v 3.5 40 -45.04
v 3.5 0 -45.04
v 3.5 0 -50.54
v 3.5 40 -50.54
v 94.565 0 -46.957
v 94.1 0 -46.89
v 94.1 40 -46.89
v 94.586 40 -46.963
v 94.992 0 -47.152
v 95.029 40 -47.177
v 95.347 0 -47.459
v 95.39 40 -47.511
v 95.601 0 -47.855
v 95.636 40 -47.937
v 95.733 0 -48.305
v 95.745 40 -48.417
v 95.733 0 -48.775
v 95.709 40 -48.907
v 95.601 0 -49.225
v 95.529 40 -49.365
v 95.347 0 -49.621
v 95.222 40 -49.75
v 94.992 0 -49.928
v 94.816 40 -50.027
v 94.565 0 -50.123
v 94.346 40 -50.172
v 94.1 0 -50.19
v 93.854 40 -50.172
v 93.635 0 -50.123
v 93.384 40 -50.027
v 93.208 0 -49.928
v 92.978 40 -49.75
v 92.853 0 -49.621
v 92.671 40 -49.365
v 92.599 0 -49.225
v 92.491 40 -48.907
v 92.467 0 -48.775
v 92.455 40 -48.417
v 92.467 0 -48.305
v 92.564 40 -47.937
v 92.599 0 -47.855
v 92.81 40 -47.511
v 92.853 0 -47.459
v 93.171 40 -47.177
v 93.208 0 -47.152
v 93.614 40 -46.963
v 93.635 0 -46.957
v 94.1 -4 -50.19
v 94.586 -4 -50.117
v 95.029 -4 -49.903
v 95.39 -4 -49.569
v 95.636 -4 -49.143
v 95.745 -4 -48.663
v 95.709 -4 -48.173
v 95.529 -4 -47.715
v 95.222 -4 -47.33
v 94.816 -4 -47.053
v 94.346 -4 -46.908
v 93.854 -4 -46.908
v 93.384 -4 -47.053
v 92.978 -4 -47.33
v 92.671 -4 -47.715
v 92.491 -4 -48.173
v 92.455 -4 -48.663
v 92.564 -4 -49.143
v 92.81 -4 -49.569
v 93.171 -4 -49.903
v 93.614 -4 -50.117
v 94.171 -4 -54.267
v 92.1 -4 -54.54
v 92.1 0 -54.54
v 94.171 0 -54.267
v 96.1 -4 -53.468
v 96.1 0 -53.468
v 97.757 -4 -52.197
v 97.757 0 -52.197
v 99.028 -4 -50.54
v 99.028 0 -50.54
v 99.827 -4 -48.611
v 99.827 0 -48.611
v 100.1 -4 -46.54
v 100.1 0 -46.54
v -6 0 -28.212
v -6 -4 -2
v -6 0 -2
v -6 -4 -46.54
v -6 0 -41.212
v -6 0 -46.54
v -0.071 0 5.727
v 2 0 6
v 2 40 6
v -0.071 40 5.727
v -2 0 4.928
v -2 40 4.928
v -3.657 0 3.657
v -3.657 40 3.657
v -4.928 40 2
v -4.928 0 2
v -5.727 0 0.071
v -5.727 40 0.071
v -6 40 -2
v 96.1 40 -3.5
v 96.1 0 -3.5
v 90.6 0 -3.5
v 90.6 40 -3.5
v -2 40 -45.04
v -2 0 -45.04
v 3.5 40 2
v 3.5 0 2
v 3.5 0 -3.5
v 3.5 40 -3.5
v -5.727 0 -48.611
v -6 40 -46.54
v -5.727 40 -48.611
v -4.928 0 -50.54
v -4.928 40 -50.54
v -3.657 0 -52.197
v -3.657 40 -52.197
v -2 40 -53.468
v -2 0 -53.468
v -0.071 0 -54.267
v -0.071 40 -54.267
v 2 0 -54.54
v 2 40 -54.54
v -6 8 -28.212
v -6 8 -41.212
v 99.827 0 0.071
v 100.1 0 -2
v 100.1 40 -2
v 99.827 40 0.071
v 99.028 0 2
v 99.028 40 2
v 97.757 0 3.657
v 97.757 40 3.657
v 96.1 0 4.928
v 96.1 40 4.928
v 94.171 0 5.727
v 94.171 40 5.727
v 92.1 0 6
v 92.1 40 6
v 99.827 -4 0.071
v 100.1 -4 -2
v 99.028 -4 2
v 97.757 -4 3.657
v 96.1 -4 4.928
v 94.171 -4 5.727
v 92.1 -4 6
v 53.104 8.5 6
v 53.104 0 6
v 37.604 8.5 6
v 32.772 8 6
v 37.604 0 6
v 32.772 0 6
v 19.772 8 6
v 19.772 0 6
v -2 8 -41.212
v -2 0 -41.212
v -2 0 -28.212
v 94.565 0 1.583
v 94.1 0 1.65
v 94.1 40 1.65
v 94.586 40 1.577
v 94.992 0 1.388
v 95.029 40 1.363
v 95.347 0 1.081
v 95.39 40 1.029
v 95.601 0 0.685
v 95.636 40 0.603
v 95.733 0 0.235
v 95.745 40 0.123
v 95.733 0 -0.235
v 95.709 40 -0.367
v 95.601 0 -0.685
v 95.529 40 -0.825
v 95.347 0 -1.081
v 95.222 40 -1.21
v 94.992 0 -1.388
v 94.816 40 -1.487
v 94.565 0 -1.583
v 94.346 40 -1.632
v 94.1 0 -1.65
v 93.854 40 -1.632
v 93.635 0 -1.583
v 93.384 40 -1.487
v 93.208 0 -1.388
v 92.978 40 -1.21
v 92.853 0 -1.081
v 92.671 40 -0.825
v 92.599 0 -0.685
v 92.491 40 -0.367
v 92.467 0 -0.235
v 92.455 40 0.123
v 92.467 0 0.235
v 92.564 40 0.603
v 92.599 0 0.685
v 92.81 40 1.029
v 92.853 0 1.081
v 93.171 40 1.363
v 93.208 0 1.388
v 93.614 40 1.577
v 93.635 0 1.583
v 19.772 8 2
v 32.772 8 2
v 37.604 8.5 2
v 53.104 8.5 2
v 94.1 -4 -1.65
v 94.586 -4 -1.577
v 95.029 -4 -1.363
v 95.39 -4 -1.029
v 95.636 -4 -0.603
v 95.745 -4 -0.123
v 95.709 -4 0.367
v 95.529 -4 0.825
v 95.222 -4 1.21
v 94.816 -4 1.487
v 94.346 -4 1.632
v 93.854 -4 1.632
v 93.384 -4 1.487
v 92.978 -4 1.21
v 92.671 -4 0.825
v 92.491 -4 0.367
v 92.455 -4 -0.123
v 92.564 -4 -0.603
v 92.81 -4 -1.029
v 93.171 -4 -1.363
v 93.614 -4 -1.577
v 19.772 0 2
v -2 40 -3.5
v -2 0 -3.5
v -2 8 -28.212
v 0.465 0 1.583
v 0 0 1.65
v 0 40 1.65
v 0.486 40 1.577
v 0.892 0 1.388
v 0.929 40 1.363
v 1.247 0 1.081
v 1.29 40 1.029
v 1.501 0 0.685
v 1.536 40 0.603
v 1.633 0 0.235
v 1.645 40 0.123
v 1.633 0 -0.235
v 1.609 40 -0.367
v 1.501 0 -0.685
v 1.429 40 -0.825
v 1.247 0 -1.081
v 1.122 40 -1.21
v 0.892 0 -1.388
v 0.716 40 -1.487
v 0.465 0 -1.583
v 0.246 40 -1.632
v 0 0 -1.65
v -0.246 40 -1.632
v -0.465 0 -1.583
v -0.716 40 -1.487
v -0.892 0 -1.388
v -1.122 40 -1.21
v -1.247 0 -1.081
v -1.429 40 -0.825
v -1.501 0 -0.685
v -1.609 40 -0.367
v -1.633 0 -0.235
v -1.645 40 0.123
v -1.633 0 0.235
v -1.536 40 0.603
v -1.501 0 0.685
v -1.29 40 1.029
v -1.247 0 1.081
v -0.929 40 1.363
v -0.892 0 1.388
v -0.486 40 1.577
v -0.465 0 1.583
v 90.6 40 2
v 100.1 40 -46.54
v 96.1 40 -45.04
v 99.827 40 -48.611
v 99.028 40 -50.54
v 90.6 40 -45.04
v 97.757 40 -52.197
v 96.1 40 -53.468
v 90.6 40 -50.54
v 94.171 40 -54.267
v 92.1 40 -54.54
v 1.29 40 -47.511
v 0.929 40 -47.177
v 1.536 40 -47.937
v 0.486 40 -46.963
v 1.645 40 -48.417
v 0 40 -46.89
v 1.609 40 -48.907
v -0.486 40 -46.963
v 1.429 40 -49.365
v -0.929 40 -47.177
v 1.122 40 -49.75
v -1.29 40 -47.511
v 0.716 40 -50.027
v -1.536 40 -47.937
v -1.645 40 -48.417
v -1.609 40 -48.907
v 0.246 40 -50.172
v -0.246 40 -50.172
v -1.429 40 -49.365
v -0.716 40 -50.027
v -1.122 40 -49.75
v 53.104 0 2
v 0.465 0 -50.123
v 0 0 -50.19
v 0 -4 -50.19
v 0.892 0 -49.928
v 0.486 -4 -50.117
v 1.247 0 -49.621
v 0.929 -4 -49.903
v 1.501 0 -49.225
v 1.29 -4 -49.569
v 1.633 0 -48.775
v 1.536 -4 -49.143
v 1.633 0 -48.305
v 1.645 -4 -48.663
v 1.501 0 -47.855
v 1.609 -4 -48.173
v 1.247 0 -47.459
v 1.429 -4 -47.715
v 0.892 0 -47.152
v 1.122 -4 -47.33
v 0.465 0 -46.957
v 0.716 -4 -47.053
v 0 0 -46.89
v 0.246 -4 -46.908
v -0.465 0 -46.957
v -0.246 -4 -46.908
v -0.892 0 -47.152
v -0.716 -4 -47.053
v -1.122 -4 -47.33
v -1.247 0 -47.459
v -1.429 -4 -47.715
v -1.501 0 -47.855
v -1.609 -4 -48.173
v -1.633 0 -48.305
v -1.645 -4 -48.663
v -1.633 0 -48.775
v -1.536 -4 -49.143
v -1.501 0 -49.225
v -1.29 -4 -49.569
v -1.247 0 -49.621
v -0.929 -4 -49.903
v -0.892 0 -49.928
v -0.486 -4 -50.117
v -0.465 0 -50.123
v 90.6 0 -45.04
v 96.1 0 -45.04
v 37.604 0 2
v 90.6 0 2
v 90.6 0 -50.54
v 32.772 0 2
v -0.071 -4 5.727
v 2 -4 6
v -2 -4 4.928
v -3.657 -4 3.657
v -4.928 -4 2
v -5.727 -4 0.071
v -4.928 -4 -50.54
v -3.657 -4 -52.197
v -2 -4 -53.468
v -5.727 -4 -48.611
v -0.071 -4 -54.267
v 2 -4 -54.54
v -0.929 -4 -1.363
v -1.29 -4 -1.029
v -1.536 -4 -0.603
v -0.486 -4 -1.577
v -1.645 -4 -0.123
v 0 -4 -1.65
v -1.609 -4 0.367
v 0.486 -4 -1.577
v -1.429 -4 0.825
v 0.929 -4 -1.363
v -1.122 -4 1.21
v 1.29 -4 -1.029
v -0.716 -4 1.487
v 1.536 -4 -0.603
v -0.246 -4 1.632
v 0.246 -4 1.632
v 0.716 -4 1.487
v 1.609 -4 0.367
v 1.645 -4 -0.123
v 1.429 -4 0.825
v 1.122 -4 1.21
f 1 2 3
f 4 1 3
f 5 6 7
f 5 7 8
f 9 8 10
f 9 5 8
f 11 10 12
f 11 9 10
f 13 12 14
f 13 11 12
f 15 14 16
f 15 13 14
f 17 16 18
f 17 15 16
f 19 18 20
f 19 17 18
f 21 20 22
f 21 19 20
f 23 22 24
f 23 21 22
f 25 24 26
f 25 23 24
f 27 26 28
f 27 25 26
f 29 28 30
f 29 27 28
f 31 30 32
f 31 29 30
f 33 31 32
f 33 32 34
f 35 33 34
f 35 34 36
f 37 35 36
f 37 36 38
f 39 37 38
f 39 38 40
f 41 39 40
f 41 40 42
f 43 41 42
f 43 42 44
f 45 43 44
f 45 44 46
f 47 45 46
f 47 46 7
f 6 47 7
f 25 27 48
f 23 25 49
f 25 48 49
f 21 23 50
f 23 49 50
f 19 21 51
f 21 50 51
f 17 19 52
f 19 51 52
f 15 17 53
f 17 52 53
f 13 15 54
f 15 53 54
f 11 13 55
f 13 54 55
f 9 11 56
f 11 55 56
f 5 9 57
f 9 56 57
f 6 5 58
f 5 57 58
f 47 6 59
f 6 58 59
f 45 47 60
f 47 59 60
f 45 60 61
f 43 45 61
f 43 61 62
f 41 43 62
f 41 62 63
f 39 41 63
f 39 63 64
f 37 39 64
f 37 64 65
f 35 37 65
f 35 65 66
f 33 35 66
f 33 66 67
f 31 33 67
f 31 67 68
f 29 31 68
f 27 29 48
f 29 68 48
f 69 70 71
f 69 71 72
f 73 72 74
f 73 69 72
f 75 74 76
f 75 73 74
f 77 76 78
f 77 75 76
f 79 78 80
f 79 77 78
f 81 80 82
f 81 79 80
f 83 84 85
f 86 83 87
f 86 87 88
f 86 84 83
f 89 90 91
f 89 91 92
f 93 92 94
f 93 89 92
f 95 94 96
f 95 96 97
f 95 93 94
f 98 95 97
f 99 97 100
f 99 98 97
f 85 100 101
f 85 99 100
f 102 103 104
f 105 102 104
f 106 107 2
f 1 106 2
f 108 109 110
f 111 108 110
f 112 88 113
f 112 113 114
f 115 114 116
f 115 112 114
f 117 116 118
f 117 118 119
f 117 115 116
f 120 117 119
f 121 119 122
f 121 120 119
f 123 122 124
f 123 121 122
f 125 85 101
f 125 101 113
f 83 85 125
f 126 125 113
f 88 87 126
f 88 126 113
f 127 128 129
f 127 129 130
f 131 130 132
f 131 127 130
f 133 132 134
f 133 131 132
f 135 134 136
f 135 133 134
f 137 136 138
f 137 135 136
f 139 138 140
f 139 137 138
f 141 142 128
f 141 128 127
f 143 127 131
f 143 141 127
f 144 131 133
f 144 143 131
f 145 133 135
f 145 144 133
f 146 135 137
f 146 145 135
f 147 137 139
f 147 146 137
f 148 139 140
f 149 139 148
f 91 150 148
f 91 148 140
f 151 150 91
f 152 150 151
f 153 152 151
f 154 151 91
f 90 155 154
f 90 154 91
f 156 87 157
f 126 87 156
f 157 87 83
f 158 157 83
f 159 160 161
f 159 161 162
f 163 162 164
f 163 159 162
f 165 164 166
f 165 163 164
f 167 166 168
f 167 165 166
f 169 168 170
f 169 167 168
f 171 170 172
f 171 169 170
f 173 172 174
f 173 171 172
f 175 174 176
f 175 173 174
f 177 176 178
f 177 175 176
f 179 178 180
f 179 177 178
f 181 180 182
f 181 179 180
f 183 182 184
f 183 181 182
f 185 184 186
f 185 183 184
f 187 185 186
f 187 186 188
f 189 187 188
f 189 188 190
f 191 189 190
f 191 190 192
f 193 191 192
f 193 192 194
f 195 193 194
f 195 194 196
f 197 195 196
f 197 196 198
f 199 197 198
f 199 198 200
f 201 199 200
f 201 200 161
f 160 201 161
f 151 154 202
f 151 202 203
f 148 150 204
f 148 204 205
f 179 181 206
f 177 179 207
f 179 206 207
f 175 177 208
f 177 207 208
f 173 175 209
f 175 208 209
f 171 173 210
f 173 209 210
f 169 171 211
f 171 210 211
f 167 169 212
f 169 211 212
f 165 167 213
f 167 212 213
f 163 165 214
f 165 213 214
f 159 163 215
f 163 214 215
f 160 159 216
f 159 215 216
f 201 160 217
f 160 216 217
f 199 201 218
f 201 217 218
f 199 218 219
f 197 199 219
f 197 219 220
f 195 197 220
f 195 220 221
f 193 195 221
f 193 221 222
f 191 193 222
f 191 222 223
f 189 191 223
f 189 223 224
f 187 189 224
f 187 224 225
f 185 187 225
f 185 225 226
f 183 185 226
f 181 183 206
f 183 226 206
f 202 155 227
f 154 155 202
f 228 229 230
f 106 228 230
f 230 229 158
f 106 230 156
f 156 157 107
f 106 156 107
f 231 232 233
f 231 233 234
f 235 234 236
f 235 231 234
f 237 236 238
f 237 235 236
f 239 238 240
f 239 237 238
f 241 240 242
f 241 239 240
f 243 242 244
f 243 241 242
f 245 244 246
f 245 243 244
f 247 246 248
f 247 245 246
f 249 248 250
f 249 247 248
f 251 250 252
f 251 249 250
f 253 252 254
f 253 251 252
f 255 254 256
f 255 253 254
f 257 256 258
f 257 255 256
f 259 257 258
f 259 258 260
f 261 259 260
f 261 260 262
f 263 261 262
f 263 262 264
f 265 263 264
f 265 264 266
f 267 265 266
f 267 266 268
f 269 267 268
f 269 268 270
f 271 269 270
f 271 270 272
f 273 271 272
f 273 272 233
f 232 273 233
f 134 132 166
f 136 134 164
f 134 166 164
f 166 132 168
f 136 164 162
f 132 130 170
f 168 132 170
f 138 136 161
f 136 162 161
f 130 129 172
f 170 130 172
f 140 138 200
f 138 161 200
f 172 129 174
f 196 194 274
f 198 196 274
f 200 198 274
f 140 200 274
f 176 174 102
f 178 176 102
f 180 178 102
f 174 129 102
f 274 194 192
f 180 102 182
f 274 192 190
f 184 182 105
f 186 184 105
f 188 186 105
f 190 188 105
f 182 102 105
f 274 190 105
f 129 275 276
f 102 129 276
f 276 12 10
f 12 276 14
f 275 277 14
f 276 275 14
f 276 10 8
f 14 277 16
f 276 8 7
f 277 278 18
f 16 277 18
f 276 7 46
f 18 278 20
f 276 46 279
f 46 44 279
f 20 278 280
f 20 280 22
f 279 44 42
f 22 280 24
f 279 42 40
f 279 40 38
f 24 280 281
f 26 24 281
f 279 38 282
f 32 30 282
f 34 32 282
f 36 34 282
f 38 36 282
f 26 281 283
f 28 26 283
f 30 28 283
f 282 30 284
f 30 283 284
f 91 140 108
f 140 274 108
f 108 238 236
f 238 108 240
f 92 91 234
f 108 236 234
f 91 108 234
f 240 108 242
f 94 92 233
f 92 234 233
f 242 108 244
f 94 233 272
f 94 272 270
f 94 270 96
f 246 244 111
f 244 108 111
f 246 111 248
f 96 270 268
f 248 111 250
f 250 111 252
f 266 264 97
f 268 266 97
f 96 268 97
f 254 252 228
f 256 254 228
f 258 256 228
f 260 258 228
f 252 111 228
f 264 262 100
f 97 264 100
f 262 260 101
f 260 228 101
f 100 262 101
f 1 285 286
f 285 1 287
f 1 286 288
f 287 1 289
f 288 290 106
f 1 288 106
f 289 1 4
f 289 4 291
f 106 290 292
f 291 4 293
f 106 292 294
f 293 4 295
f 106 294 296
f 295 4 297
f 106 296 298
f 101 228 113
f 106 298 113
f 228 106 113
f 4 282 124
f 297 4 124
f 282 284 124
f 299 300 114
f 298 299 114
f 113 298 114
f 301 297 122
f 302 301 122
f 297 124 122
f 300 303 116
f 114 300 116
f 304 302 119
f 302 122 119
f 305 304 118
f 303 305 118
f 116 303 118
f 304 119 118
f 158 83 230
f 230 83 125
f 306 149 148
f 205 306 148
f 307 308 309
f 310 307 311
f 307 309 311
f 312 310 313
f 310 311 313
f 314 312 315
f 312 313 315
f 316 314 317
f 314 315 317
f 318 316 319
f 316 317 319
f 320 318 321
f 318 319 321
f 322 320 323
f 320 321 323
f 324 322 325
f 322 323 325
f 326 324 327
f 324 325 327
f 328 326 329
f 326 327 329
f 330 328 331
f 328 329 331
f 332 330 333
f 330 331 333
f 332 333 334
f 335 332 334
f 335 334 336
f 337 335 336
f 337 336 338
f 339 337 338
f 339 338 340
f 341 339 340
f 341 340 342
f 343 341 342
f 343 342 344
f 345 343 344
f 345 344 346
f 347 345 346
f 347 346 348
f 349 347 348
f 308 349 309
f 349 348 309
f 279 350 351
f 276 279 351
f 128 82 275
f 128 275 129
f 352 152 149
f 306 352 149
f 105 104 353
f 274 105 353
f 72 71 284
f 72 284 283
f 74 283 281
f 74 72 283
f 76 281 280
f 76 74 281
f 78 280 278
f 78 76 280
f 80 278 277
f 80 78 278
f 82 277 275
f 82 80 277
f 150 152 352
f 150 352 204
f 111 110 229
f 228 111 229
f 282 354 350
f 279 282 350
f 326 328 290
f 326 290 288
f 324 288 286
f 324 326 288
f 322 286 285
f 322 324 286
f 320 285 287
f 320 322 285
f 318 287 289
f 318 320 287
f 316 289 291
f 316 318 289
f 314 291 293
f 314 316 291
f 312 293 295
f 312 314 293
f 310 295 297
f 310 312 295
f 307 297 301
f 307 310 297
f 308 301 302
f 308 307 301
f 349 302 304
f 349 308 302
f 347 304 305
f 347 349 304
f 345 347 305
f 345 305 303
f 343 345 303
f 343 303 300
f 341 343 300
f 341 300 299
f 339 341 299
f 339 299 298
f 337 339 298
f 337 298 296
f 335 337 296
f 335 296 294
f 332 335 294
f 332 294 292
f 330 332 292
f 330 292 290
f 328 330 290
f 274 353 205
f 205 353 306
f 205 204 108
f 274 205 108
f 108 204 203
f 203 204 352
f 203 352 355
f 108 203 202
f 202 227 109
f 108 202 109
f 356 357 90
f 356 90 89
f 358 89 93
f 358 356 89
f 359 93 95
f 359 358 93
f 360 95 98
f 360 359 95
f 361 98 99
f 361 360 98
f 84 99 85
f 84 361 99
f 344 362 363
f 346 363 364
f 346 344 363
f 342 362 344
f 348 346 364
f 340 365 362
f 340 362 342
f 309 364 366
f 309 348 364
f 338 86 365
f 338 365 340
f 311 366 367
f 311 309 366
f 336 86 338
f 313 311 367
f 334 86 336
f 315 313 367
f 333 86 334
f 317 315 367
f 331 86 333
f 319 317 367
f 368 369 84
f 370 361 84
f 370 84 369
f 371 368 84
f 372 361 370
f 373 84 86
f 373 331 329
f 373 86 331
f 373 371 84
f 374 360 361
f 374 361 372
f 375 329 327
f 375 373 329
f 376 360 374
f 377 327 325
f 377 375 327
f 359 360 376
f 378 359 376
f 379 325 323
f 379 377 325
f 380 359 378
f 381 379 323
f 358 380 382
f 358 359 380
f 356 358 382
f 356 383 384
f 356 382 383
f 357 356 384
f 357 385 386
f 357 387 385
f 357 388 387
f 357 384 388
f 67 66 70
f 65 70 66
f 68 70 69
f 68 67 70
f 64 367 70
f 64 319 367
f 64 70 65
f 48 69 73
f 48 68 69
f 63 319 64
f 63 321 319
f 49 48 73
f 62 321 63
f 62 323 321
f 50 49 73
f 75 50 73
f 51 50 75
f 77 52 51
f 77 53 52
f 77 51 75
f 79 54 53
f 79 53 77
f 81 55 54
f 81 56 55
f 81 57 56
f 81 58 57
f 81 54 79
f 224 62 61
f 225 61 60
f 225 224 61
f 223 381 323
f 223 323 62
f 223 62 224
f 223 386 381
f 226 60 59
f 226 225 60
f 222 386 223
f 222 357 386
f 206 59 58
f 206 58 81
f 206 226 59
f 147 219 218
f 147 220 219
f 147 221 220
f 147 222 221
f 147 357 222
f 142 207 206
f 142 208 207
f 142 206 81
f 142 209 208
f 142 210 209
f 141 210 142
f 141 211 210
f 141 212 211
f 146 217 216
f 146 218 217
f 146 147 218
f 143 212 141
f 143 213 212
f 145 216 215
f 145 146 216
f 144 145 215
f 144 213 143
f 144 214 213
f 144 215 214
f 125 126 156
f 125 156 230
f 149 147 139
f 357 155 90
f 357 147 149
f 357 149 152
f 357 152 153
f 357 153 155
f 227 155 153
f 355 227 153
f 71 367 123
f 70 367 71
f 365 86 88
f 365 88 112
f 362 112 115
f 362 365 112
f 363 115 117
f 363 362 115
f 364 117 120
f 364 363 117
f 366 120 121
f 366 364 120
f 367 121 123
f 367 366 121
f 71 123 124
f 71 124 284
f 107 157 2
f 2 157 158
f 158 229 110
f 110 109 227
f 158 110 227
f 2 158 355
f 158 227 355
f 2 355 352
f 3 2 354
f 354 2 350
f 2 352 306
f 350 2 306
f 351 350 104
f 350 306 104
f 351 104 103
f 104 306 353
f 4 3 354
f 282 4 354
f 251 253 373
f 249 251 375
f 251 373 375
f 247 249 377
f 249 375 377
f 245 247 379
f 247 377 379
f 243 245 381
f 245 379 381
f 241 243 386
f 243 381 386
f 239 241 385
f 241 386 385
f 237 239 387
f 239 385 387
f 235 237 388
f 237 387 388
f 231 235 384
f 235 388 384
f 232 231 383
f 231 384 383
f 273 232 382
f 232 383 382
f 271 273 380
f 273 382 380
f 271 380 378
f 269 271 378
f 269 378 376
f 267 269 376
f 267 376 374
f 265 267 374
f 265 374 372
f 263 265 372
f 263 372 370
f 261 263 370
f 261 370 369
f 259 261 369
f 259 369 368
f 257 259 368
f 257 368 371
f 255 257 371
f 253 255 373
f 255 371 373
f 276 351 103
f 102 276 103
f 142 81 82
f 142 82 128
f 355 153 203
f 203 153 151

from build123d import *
from build123d.topology import SkipClean

# Parameters (mm, degrees)
SKETCH1_R           = 1.65
BOSS_EXTRUDE1_DEPTH = 40
BOSS_EXTRUDE2_START = 4
SKETCH2_R           = 1.65
BOSS_EXTRUDE2_DEPTH = 4
SKETCH3_W           = 15.5
SKETCH3_H           = 8.5
CUT_EXTRUDE1_DEPTH  = 4
SKETCH5_W           = 13
SKETCH5_H           = 8
CUT_EXTRUDE2_DEPTH  = 4
SKETCH6_W           = 13
SKETCH6_H           = 8
CUT_EXTRUDE3_DEPTH  = 4


with BuildPart() as part:
    # Sketch1 → Boss-Extrude1 (new body)
    with BuildSketch(Plane(origin=(0, 0, 0), x_dir=(1, 0, 0), z_dir=(0, 1, 0))):
        with BuildLine():
            Line((2, 54.54), (92.1, 54.54))
            ThreePointArc((92.1, 54.54), (97.756854249, 52.196854249), (100.1, 46.54))
            Line((100.1, 46.54), (100.1, 2))
            ThreePointArc((100.1, 2), (97.756854249, -3.656854249), (92.1, -6))
            Line((92.1, -6), (2, -6))
            ThreePointArc((2, -6), (-3.656854249, -3.656854249), (-6, 2))
            Line((-6, 2), (-6, 46.54))
            ThreePointArc((-6, 46.54), (-3.656854249, 52.196854249), (2, 54.54))
        make_face()
        with Locations(Location((0, 48.54, 0), (0, 0, 270))):
            Circle(SKETCH1_R, mode=Mode.SUBTRACT)
        with Locations(Location((0, 0, 0), (0, 0, 270))):
            Circle(SKETCH1_R, mode=Mode.SUBTRACT)
        with Locations(Location((94.1, 48.54, 0), (0, 0, 270))):
            Circle(SKETCH1_R, mode=Mode.SUBTRACT)
        with Locations(Location((94.1, 0, 0), (0, 0, 270))):
            Circle(SKETCH1_R, mode=Mode.SUBTRACT)
        Polygon((-2, 45.04), (3.5, 45.04), (3.5, 50.54), (90.6, 50.54), (90.6, 45.04), (96.1, 45.04), (96.1, 3.5), (90.6, 3.5), (90.6, -2), (3.5, -2), (3.5, 3.5), (-2, 3.5), align=None, mode=Mode.SUBTRACT)
    extrude(amount=BOSS_EXTRUDE1_DEPTH)

    # Sketch2 → Boss-Extrude2 (add)
    with SkipClean():  # the faces are left unmerged after this step: merging them gives an invalid solid
        with BuildSketch(Plane.XZ.offset(BOSS_EXTRUDE2_START)):
            with BuildLine():
                Line((100.1, -46.54), (100.1, -2))
                ThreePointArc((100.1, -2), (97.756854249, 3.656854249), (92.1, 6))
                Line((92.1, 6), (2, 6))
                ThreePointArc((2, 6), (-3.656854249, 3.656854249), (-6, -2))
                Line((-6, -2), (-6, -46.54))
                ThreePointArc((-6, -46.54), (-3.656854249, -52.196854249), (2, -54.54))
                Line((2, -54.54), (92.1, -54.54))
                ThreePointArc((92.1, -54.54), (97.756854249, -52.196854249), (100.1, -46.54))
            make_face()
            with Locations(Location((94.1, 0, 0), (0, 0, 270))):
                Circle(SKETCH2_R, mode=Mode.SUBTRACT)
            with Locations(Location((94.1, -48.54, 0), (0, 0, 270))):
                Circle(SKETCH2_R, mode=Mode.SUBTRACT)
            with Locations(Location((0, -48.54, 0), (0, 0, 270))):
                Circle(SKETCH2_R, mode=Mode.SUBTRACT)
            with Locations(Location((0, 0, 0), (0, 0, 270))):
                Circle(SKETCH2_R, mode=Mode.SUBTRACT)
        extrude(amount=-BOSS_EXTRUDE2_DEPTH)

    # Sketch3 → Cut-Extrude1 (cut)
    with SkipClean():  # the faces are left unmerged after this step: merging them gives an invalid solid
        with BuildSketch(Plane.XY.offset(6)):
            with Locations((45.353986939, 4.25)):
                Rectangle(SKETCH3_W, SKETCH3_H)
        extrude(amount=-CUT_EXTRUDE1_DEPTH, mode=Mode.SUBTRACT)

    # Sketch5 → Cut-Extrude2 (cut)
    with SkipClean():  # the faces are left unmerged after this step: merging them gives an invalid solid
        with BuildSketch(Plane.ZY.offset(6)):
            with Locations((-34.712384261, 4)):
                Rectangle(SKETCH5_W, SKETCH5_H)
        extrude(amount=-CUT_EXTRUDE2_DEPTH, mode=Mode.SUBTRACT)

    # Sketch6 → Cut-Extrude3 (cut)
    with SkipClean():  # the faces are left unmerged after this step: merging them gives an invalid solid
        with BuildSketch(Plane.XY.offset(6)):
            with Locations((26.272328528, 4)):
                Rectangle(SKETCH6_W, SKETCH6_H)
        extrude(amount=-CUT_EXTRUDE3_DEPTH, mode=Mode.SUBTRACT)


solid = part.part
